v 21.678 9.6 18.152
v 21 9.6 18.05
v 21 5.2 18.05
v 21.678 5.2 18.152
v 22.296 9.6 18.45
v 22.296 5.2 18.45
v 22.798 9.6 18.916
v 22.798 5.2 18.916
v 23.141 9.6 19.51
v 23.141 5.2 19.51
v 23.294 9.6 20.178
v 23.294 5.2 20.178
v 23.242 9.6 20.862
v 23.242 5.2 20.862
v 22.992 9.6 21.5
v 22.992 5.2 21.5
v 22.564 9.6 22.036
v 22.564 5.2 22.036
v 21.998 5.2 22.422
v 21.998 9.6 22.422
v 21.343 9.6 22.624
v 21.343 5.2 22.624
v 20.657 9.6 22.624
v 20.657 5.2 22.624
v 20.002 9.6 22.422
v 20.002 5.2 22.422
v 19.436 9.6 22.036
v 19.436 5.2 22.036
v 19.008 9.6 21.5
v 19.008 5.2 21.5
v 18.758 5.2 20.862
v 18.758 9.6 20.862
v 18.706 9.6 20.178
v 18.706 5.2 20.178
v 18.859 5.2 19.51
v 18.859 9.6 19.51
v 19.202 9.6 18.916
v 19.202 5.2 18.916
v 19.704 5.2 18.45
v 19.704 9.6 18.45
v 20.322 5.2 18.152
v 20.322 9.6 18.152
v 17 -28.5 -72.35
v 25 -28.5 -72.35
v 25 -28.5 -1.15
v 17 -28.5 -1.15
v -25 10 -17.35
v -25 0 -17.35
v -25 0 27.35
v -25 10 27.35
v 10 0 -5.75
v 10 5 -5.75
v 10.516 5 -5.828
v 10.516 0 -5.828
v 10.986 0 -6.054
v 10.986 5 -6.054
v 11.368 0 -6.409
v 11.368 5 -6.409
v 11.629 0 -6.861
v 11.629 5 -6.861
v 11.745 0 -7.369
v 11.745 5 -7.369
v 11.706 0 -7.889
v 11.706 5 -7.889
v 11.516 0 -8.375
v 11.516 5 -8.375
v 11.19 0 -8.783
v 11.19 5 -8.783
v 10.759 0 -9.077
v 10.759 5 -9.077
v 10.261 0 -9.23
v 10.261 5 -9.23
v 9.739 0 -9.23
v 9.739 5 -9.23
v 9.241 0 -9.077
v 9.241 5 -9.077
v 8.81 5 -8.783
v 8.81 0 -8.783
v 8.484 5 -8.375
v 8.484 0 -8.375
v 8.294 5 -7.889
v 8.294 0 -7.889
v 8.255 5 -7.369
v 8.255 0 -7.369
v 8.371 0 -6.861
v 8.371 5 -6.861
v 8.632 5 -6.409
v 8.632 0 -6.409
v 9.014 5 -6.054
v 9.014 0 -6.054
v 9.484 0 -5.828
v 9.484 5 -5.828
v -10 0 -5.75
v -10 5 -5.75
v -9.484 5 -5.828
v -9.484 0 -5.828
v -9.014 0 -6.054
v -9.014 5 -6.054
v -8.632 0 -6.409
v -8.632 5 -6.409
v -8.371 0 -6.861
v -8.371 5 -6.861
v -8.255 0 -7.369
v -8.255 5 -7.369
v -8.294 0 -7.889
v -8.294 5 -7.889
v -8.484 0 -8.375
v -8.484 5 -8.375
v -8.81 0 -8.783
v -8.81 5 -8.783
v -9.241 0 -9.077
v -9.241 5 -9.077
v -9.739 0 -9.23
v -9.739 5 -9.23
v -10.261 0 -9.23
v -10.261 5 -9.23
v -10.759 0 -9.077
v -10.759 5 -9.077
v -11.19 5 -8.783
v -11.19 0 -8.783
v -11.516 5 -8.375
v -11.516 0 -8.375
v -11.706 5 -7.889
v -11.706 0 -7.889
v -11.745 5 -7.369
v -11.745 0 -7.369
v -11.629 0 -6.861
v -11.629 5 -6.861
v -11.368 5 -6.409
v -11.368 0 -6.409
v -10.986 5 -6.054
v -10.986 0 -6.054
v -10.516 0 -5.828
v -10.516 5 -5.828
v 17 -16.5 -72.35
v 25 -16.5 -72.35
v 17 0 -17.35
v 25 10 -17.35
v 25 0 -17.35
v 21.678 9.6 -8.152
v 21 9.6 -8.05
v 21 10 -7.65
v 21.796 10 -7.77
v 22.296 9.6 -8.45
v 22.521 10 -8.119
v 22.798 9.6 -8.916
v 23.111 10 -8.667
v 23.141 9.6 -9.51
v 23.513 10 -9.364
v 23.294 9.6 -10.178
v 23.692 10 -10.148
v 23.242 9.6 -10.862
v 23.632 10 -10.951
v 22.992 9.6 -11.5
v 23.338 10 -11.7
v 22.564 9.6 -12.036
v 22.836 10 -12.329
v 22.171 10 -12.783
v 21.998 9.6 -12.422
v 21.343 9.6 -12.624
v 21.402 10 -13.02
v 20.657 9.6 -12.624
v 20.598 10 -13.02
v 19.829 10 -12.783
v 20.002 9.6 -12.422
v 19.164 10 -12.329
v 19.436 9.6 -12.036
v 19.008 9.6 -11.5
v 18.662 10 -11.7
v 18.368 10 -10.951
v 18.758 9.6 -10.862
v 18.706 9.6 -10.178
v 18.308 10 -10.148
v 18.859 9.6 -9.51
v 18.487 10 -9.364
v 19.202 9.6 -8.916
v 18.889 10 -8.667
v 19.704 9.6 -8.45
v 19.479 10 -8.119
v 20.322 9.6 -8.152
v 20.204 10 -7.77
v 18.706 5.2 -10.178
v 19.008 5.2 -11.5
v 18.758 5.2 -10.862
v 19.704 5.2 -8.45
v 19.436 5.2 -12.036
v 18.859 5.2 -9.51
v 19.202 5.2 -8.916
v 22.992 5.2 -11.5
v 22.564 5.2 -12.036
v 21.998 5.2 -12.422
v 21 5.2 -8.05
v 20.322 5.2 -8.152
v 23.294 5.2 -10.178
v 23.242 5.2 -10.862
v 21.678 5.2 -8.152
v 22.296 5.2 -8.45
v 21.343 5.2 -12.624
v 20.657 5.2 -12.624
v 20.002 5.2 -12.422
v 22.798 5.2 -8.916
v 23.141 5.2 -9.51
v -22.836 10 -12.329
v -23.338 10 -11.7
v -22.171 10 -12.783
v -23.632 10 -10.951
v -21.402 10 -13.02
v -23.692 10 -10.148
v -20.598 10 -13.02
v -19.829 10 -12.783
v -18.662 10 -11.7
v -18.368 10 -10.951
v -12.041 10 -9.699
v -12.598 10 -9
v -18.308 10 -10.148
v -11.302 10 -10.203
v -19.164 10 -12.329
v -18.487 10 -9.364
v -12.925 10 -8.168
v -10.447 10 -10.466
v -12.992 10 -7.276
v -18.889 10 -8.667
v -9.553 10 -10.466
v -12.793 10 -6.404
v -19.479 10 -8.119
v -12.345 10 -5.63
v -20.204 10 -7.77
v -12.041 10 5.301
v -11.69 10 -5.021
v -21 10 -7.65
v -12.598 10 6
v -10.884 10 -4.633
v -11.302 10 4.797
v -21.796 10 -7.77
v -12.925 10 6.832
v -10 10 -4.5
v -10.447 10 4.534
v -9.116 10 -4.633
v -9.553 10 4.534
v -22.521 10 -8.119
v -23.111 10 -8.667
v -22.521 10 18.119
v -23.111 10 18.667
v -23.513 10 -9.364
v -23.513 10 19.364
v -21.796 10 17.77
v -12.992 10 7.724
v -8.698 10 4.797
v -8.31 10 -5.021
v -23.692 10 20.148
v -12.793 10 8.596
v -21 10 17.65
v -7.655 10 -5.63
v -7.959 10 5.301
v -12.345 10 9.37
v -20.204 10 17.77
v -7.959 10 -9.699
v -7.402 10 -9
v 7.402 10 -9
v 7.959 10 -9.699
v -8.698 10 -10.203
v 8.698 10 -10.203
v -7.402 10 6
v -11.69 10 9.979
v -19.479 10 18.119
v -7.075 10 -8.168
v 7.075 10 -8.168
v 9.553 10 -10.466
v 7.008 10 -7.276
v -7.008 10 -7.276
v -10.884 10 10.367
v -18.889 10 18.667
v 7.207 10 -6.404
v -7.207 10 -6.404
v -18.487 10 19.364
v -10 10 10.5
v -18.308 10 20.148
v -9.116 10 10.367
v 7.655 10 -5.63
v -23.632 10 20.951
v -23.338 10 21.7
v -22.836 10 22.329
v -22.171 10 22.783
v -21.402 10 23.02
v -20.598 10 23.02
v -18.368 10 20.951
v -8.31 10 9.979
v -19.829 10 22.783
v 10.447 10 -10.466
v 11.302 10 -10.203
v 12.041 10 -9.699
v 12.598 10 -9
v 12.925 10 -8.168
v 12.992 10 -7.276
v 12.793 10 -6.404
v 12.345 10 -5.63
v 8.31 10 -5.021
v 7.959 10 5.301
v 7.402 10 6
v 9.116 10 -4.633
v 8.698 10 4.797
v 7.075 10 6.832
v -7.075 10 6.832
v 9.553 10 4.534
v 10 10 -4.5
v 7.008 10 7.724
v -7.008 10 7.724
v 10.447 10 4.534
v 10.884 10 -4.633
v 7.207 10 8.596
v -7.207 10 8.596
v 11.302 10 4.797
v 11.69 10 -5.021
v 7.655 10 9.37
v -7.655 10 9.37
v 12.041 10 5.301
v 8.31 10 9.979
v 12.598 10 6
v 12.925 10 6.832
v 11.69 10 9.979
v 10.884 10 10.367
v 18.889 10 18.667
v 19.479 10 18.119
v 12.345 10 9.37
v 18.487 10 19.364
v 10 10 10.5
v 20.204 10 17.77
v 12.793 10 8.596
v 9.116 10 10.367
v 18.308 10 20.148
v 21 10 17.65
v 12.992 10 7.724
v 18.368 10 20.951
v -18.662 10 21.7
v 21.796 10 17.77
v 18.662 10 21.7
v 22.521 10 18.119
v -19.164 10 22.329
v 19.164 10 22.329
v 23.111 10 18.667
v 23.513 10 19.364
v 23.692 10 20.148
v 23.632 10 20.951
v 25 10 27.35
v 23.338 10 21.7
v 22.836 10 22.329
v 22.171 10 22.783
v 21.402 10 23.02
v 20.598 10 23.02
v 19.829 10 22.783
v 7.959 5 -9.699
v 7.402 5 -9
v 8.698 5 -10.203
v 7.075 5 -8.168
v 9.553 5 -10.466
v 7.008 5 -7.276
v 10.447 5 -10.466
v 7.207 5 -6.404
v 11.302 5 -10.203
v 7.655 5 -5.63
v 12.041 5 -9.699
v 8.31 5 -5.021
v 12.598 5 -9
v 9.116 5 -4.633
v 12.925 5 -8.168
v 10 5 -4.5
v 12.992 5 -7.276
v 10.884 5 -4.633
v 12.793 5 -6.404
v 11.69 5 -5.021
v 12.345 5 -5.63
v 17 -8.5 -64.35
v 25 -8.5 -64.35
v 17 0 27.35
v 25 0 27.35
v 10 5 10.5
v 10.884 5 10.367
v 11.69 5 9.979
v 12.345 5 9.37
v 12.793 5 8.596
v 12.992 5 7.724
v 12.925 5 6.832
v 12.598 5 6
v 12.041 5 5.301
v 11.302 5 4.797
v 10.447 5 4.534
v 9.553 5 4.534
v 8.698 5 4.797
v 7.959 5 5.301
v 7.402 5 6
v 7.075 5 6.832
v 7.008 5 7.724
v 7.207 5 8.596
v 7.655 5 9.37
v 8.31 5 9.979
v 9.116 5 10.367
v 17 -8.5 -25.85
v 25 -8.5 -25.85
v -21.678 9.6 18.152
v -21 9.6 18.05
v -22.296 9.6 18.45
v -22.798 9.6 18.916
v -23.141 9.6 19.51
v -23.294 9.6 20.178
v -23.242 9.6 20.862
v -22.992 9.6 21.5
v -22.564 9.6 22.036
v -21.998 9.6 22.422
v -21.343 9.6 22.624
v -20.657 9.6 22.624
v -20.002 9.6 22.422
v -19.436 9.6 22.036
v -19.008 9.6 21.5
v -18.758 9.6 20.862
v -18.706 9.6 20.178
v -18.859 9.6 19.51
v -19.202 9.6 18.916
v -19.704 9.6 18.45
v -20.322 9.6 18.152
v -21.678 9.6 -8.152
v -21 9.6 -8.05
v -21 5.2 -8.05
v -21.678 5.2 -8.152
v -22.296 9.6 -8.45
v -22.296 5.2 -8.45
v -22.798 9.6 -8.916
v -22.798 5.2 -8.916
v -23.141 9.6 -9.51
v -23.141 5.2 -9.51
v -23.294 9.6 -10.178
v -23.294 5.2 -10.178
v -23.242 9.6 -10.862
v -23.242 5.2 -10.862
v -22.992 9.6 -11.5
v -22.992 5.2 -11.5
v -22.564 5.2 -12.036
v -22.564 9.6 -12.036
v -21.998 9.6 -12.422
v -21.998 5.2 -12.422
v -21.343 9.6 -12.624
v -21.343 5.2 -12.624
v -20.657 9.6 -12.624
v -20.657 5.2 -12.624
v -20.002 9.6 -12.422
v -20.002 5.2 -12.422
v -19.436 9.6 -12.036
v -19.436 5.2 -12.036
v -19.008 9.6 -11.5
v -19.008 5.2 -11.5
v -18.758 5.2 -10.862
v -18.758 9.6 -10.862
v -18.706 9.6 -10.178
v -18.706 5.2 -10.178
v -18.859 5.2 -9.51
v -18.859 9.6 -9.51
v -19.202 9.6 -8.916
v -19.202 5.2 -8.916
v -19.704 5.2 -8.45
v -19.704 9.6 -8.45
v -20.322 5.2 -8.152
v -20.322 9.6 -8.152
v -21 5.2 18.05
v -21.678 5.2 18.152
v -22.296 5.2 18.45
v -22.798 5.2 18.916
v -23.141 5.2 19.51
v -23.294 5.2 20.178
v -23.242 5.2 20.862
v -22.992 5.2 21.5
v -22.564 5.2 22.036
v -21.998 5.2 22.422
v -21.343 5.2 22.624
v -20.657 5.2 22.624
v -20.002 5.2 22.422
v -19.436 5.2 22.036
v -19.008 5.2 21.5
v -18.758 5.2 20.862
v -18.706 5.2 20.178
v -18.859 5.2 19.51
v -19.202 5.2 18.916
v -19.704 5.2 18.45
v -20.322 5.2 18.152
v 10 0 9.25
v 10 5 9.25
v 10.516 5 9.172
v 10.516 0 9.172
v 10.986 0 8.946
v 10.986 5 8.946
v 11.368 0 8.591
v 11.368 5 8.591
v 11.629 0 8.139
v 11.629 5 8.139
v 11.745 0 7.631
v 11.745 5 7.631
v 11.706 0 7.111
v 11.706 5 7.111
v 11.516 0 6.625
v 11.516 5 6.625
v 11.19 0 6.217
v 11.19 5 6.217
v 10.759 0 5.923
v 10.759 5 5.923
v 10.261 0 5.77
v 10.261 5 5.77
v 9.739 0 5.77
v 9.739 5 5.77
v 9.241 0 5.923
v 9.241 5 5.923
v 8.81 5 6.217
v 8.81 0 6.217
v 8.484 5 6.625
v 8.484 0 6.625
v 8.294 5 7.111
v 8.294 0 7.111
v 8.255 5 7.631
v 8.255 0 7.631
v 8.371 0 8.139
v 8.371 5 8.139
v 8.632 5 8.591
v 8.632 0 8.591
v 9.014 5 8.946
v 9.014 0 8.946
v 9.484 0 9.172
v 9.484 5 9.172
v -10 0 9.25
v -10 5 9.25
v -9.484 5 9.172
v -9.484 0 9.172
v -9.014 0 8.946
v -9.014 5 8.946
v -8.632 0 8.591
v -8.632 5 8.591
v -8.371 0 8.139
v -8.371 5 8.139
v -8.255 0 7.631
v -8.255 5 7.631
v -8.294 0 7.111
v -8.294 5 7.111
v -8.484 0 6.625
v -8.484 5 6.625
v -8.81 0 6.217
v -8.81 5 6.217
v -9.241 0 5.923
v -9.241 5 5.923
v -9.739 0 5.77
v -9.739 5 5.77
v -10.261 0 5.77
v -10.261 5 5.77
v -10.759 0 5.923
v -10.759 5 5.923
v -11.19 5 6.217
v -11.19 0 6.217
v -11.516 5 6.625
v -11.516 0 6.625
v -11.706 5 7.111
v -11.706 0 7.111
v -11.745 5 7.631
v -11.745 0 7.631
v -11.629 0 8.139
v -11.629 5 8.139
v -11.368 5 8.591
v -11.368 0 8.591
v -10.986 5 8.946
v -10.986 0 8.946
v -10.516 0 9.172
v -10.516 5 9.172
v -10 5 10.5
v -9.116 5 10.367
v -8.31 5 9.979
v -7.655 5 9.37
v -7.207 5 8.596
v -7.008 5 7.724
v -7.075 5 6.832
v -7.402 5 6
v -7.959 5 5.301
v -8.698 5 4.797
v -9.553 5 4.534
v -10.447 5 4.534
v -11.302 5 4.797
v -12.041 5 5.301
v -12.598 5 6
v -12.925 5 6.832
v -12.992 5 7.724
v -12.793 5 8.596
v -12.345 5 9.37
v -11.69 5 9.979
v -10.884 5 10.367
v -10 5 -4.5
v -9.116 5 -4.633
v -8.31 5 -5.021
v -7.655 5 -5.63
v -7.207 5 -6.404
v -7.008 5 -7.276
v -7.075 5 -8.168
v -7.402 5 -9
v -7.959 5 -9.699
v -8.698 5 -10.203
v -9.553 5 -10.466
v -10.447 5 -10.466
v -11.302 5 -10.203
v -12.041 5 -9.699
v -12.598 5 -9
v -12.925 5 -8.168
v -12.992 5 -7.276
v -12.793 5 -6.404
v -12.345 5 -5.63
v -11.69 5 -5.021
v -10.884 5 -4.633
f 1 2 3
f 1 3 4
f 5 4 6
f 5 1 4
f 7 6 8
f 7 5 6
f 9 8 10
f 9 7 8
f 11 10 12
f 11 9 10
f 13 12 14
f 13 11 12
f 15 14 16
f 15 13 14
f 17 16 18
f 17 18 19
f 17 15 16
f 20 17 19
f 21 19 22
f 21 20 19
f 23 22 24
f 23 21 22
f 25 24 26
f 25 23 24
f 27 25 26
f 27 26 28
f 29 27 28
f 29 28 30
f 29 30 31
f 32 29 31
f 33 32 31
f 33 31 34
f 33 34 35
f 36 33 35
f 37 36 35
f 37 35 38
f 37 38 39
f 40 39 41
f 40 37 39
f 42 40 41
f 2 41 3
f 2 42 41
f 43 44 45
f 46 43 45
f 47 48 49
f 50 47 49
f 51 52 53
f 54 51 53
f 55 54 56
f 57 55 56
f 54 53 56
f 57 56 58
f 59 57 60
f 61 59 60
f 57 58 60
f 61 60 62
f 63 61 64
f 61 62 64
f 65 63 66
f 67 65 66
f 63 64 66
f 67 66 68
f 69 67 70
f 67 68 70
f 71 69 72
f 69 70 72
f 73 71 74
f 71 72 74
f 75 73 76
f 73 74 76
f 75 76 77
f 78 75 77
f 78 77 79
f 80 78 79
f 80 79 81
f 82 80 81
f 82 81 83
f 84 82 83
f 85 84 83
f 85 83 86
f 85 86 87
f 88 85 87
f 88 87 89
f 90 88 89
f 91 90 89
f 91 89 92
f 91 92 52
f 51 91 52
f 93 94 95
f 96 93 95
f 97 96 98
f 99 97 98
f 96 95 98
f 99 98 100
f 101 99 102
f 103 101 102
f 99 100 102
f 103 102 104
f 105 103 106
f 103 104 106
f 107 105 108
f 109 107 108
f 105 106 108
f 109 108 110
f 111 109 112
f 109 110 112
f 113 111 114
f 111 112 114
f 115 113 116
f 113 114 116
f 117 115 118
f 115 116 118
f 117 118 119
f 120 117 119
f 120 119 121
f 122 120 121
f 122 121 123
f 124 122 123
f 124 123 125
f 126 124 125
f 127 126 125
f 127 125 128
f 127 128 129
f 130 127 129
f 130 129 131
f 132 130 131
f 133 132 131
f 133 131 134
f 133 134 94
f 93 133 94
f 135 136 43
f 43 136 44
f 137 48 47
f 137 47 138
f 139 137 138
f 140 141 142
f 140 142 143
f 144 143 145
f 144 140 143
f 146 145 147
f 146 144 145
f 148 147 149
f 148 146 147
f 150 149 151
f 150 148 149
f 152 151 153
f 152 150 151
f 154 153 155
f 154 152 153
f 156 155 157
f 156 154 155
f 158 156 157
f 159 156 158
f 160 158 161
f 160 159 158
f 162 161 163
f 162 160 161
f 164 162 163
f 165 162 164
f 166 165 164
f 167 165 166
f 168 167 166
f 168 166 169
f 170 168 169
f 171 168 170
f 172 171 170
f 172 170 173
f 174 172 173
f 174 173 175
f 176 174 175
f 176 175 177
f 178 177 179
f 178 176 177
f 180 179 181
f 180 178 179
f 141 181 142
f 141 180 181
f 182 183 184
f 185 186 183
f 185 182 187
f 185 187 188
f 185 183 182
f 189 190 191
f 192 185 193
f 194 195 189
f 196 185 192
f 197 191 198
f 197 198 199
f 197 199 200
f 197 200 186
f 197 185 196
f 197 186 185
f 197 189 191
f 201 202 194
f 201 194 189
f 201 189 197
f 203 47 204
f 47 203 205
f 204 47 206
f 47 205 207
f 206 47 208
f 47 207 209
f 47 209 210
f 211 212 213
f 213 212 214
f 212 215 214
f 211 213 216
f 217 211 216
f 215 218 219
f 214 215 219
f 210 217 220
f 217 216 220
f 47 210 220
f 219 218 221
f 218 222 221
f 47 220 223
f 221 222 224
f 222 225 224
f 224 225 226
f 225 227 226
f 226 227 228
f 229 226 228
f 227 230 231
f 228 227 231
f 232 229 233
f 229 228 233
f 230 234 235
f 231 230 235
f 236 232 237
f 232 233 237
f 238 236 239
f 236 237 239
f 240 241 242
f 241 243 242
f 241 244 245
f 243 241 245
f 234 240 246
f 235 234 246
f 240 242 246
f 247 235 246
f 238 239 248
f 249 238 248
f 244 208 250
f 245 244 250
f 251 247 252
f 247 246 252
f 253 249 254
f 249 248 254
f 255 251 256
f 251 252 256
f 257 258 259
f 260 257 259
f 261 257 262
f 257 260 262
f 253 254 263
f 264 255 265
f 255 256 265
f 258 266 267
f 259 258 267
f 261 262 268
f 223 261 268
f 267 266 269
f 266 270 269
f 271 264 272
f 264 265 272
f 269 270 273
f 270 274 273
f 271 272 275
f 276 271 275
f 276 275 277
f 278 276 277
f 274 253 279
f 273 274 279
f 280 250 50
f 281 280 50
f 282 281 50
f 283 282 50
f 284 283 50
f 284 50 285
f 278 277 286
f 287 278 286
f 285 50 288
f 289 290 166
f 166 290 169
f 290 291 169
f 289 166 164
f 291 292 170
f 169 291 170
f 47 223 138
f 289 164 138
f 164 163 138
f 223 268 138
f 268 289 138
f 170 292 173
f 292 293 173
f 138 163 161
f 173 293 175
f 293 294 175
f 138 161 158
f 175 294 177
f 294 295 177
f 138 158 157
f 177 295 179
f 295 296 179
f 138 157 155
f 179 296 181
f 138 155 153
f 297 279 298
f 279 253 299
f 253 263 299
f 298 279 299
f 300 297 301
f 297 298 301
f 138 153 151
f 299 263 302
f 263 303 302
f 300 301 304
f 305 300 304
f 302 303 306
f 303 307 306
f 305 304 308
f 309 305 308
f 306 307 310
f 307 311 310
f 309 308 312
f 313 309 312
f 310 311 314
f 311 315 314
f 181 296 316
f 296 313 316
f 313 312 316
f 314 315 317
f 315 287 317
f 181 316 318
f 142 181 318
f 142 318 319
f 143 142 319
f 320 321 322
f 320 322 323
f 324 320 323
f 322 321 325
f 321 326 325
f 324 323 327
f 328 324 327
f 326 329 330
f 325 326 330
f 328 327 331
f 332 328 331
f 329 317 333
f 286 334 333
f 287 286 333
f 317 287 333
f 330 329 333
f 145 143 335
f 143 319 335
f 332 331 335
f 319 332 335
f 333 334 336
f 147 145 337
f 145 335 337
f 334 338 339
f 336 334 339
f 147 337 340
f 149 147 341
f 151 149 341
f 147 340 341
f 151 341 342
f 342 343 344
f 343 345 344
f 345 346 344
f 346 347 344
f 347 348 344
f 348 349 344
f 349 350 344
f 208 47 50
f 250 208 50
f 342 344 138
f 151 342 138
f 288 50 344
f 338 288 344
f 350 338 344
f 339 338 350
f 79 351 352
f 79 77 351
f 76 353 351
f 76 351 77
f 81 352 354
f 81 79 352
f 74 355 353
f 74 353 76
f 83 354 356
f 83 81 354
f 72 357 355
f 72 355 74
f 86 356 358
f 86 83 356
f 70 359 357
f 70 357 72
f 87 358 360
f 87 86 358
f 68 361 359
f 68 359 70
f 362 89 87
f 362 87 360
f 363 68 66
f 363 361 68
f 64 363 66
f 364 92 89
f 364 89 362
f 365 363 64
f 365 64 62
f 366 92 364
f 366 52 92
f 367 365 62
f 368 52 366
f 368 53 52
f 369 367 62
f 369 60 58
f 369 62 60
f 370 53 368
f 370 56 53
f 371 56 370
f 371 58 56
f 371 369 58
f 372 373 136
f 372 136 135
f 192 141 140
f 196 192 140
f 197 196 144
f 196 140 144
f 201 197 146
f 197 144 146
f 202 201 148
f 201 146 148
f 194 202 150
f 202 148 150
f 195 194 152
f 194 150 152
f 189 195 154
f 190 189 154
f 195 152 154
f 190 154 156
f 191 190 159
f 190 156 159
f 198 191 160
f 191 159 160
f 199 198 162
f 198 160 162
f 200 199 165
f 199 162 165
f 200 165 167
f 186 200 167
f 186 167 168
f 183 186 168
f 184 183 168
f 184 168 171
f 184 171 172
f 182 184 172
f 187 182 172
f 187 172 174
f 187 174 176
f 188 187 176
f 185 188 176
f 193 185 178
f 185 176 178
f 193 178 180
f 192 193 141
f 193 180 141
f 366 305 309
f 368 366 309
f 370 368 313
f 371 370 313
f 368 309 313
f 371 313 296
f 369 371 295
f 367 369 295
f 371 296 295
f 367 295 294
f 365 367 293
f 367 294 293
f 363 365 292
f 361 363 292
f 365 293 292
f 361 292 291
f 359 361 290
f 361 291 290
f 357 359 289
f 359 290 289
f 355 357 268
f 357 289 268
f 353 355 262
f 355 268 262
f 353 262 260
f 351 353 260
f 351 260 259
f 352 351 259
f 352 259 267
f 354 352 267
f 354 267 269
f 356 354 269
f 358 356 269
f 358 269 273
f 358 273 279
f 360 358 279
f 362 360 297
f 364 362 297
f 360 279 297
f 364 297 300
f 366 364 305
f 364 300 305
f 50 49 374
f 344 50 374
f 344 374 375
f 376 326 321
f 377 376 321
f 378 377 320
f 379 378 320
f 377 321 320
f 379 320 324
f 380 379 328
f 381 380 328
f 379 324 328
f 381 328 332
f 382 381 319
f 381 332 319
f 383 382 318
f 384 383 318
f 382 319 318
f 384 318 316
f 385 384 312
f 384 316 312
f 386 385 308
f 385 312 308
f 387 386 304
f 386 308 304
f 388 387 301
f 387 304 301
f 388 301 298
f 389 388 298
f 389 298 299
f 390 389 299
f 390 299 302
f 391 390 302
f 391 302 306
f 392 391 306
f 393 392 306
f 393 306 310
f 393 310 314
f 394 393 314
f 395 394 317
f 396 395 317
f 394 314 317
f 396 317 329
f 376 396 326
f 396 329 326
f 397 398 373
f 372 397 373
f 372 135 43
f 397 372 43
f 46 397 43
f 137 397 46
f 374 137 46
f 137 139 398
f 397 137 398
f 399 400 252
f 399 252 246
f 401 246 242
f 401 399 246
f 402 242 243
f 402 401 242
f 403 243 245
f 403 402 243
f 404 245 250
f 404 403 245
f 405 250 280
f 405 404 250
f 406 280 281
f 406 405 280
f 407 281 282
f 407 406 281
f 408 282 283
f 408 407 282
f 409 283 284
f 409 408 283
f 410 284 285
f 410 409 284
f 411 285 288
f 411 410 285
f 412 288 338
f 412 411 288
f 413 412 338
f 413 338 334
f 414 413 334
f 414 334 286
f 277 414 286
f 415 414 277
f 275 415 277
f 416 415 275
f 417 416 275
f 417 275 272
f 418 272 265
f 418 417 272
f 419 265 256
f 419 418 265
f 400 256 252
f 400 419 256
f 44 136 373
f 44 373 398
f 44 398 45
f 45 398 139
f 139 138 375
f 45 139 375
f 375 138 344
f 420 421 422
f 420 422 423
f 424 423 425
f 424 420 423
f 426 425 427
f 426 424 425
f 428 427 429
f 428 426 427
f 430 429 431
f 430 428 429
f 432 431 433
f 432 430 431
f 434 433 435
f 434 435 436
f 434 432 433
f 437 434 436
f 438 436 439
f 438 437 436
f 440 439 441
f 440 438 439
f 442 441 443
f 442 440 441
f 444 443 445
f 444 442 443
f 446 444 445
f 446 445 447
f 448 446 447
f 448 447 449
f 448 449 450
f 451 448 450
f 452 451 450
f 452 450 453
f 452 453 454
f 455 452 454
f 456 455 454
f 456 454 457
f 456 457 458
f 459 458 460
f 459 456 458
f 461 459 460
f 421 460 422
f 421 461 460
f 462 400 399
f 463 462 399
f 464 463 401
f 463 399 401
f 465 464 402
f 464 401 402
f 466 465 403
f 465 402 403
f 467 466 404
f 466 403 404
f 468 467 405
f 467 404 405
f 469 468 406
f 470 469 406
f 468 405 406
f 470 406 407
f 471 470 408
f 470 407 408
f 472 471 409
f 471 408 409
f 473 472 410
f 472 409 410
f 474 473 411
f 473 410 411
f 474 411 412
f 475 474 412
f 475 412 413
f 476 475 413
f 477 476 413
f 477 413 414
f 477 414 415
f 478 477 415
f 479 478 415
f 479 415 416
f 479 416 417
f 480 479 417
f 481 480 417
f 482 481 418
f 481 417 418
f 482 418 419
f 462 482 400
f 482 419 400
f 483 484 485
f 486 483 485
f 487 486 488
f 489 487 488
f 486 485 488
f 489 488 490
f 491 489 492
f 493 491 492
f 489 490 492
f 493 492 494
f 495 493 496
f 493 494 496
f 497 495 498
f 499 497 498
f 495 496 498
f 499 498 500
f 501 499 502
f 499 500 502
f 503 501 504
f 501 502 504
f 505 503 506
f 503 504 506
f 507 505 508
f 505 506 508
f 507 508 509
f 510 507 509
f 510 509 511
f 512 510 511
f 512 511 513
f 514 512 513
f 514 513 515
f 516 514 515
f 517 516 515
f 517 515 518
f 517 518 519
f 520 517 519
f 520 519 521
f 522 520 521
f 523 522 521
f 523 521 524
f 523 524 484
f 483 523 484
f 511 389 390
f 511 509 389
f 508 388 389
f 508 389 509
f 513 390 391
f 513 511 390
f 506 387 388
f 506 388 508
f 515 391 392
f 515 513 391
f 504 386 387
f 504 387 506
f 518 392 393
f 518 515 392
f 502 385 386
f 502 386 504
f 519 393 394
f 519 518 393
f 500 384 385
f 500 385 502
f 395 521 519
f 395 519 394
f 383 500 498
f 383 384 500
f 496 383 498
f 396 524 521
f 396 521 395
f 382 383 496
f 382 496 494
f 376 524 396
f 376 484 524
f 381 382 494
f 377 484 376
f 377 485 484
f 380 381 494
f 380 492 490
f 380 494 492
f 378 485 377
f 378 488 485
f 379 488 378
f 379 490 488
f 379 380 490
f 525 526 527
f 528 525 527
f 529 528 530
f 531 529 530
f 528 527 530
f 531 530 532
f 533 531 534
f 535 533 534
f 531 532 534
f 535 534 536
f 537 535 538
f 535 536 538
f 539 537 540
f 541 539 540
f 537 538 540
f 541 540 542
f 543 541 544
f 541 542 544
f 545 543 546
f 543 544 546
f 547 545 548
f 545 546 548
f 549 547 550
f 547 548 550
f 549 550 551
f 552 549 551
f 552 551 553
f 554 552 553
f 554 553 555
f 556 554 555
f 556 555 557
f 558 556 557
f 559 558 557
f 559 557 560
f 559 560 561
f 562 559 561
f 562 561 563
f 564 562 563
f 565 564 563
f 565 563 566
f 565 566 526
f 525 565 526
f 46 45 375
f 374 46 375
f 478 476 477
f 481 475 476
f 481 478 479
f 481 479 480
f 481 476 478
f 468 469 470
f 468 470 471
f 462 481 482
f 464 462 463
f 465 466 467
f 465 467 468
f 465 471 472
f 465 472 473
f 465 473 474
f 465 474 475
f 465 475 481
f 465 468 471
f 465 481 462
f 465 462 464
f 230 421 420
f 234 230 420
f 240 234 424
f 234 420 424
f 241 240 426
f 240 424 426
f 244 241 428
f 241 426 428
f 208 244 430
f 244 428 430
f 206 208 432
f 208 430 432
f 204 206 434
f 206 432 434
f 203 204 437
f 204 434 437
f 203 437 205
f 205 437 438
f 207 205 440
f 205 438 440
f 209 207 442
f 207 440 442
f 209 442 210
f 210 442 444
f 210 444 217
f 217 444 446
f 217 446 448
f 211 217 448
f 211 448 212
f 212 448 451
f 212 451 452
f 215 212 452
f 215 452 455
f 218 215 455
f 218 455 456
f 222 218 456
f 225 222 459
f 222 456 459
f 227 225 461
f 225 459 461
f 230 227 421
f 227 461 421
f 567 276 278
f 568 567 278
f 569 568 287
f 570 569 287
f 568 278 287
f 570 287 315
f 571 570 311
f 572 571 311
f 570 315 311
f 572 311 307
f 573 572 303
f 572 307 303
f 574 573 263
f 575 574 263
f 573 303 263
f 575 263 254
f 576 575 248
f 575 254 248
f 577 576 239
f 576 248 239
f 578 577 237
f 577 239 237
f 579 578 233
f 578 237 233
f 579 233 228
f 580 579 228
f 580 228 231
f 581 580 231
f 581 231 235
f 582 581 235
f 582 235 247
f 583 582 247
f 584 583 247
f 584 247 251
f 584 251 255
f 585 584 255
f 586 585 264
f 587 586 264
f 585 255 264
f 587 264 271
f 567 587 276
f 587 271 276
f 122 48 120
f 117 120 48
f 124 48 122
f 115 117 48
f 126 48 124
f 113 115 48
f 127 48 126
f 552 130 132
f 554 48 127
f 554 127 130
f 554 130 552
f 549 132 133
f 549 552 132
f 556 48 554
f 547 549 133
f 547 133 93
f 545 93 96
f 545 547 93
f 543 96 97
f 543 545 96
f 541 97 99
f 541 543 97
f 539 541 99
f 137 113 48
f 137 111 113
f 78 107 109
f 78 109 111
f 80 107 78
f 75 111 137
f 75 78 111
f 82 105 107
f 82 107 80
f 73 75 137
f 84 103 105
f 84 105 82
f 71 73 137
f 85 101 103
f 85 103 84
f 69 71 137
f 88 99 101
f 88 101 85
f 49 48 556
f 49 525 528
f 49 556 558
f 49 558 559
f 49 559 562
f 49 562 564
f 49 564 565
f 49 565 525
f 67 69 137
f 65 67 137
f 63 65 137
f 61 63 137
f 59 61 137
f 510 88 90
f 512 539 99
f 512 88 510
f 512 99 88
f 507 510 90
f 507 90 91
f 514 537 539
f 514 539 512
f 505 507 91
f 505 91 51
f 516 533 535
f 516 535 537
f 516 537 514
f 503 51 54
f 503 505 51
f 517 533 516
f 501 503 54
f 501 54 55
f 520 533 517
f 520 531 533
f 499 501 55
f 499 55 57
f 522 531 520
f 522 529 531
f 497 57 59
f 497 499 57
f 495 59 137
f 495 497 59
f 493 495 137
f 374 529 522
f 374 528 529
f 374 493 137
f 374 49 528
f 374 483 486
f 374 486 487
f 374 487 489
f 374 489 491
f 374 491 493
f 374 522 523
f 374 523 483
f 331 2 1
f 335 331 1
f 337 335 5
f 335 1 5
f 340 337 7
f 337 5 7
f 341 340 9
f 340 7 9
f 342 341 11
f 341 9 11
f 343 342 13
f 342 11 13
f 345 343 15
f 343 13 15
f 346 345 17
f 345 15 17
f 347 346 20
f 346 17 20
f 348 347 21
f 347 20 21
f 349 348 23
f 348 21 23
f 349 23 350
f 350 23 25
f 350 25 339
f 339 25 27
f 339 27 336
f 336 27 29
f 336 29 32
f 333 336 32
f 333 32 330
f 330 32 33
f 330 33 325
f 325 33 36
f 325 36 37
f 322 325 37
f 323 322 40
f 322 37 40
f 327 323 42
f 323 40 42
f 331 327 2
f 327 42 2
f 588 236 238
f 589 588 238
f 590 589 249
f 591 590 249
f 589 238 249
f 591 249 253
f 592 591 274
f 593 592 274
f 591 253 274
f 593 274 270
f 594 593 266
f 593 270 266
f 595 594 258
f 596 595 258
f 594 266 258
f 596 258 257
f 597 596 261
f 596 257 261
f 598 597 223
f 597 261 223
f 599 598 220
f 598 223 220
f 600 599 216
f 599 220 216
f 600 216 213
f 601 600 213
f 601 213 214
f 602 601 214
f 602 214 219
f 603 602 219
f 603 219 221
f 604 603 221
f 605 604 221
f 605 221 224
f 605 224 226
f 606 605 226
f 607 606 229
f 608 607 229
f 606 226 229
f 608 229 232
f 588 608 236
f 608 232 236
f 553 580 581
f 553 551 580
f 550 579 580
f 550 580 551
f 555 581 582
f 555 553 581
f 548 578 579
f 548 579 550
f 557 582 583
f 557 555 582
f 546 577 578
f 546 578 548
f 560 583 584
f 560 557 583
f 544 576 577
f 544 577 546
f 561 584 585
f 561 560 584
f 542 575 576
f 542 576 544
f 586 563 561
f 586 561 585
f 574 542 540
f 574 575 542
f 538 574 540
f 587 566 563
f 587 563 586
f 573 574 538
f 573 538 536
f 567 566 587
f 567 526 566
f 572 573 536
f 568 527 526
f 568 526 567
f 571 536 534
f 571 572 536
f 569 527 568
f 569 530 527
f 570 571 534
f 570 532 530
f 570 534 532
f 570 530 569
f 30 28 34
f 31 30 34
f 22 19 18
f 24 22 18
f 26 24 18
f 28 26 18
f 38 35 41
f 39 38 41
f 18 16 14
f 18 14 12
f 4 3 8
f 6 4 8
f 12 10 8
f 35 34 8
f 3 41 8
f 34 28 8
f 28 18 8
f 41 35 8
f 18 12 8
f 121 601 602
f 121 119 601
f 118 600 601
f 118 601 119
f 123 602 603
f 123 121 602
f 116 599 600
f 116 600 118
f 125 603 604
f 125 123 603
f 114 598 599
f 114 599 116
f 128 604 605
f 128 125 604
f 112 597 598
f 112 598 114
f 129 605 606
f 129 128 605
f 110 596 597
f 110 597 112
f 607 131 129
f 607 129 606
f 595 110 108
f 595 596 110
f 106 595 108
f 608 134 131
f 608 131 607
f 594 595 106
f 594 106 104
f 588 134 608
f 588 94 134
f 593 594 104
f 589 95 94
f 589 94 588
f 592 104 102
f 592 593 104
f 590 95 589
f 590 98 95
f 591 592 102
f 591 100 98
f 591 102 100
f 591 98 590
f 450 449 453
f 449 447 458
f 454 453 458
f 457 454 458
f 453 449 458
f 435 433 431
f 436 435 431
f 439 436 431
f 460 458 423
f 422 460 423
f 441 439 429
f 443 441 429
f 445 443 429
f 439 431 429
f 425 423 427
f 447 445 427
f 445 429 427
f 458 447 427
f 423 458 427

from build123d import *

# Parameters (mm, degrees)
SKETCH1_W               = 50
SKETCH1_H               = 34.7
BOSS_EXTRUDE1_DEPTH     = 10
CUT_EXTRUDE1_REACH      = 34.032
SKETCH2_R               = 1.75
SKETCH3_R               = 3
CUT_EXTRUDE2_DEPTH      = 5
SKETCH6_W               = 50
SKETCH6_H               = 10
BOSS_EXTRUDE3_DEPTH     = 10
BOSS_EXTRUDE4_DEPTH     = 8
CHAMFER1_SIZE           = 8
SKETCH10_R              = 2.3
CUT_EXTRUDE3_DEPTH      = 4.8
MIRROR2_COPY_1_SKETCH_R = 2.3
MIRROR2_COPY_1_DEPTH    = 4.8
CHAMFER2_SIZE           = 0.4


with BuildPart() as part:
    # Sketch1 → Boss-Extrude1 (new body)
    with BuildSketch(Plane(origin=(0, 0, 0), x_dir=(1, 0, 0), z_dir=(0, 1, 0))):
        Rectangle(SKETCH1_W, SKETCH1_H)
    extrude(amount=BOSS_EXTRUDE1_DEPTH)

    # Sketch2 → Cut-Extrude1 (cut, up to next)
    with BuildSketch(Plane(origin=(0, 10, 0), x_dir=(1, 0, 0), z_dir=(0, 1, 0)), mode=Mode.PRIVATE) as cut_extrude1_sk1:
        with Locations(Location((-10, 7.5, 0), (0, 0, 270))):
            Circle(SKETCH2_R)
    cut_extrude1_tool1 = extrude(cut_extrude1_sk1.sketch, amount=-CUT_EXTRUDE1_REACH, mode=Mode.PRIVATE) & part.part
    # Sketch2 → Cut-Extrude1 (cut, up to next)
    with BuildSketch(Plane(origin=(0, 10, 0), x_dir=(1, 0, 0), z_dir=(0, 1, 0)), mode=Mode.PRIVATE) as cut_extrude1_sk2:
        with Locations(Location((10, 7.5, 0), (0, 0, 270))):
            Circle(SKETCH2_R)
    cut_extrude1_tool2 = extrude(cut_extrude1_sk2.sketch, amount=-CUT_EXTRUDE1_REACH, mode=Mode.PRIVATE) & part.part
    # Sketch2 → Cut-Extrude1 (cut, up to next)
    with BuildSketch(Plane(origin=(0, 10, 0), x_dir=(1, 0, 0), z_dir=(0, 1, 0)), mode=Mode.PRIVATE) as cut_extrude1_sk3:
        with Locations(Location((10, -7.5, 0), (0, 0, 270))):
            Circle(SKETCH2_R)
    cut_extrude1_tool3 = extrude(cut_extrude1_sk3.sketch, amount=-CUT_EXTRUDE1_REACH, mode=Mode.PRIVATE) & part.part
    # Sketch2 → Cut-Extrude1 (cut, up to next)
    with BuildSketch(Plane(origin=(0, 10, 0), x_dir=(1, 0, 0), z_dir=(0, 1, 0)), mode=Mode.PRIVATE) as cut_extrude1_sk4:
        with Locations(Location((-10, -7.5, 0), (0, 0, 270))):
            Circle(SKETCH2_R)
    cut_extrude1_tool4 = extrude(cut_extrude1_sk4.sketch, amount=-CUT_EXTRUDE1_REACH, mode=Mode.PRIVATE) & part.part
    add(cut_extrude1_tool1.solids().sort_by_distance((-10, 10, -7.5))[0], mode=Mode.SUBTRACT)
    add(cut_extrude1_tool2.solids().sort_by_distance((10, 10, -7.5))[0], mode=Mode.SUBTRACT)
    add(cut_extrude1_tool3.solids().sort_by_distance((10, 10, 7.5))[0], mode=Mode.SUBTRACT)
    add(cut_extrude1_tool4.solids().sort_by_distance((-10, 10, 7.5))[0], mode=Mode.SUBTRACT)

    # Sketch3 → Cut-Extrude2 (cut)
    with BuildSketch(Plane(origin=(0, 10, 0), x_dir=(1, 0, 0), z_dir=(0, 1, 0))):
        with Locations(Location((-10, 7.5, 0), (0, 0, 270))):
            Circle(SKETCH3_R)
        with Locations(Location((10, 7.5, 0), (0, 0, 270))):
            Circle(SKETCH3_R)
        with Locations(Location((10, -7.5, 0), (0, 0, 270))):
            Circle(SKETCH3_R)
        with Locations(Location((-10, -7.5, 0), (0, 0, 270))):
            Circle(SKETCH3_R)
    extrude(amount=-CUT_EXTRUDE2_DEPTH, mode=Mode.SUBTRACT)

    # Sketch6 → Boss-Extrude3 (add)
    with BuildSketch(Plane.XZ):
        with Locations((0, 22.35)):
            Rectangle(SKETCH6_W, SKETCH6_H)
    extrude(amount=-BOSS_EXTRUDE3_DEPTH)

    # Sketch8 → Boss-Extrude4 (add)
    with BuildSketch(Plane(origin=(25, 0, 0), x_dir=(0, 0, -1), z_dir=(1, 0, 0))):
        Polygon((-27.35, 0), (17.35, 0), (25.85, -8.5), (72.35, -8.5), (72.35, -28.5), (1.15, -28.5), align=None)
    extrude(amount=-BOSS_EXTRUDE4_DEPTH)

    # Chamfer1
    chamfer1_edges = [part.edges().sort_by_distance(p)[0] for p in [
        (21, -8.5, -72.35),
    ]]
    chamfer(chamfer1_edges, length=CHAMFER1_SIZE)

    # Sketch10 → Cut-Extrude3 (cut)
    with BuildSketch(Plane(origin=(0, 10, 0), x_dir=(1, 0, 0), z_dir=(0, 1, 0))):
        with Locations(Location((21, 10.35, 0), (0, 0, 270))):
            Circle(SKETCH10_R)
    cut_extrude3 = extrude(amount=-CUT_EXTRUDE3_DEPTH, mode=Mode.SUBTRACT)

    # Mirror1: Cut-Extrude3 across plane
    add(cut_extrude3.mirror(Plane(origin=(0, 0, 5), x_dir=(1, 0, 0), z_dir=(0, 0, -1))), mode=Mode.SUBTRACT)

    # Mirror2: Cut-Extrude3 across plane
    add(cut_extrude3.mirror(Plane.ZY), mode=Mode.SUBTRACT)

    # Mirror2 copy 1 sketch → Mirror2 copy 1 (cut)
    with BuildSketch(Plane(origin=(0, 10, 10), x_dir=(-1, 0, 0), z_dir=(0, 1, 0))):
        with Locations(Location((21, 10.35, 0), (0, 0, 270))):
            Circle(MIRROR2_COPY_1_SKETCH_R)
    extrude(amount=-MIRROR2_COPY_1_DEPTH, mode=Mode.SUBTRACT)

    # Chamfer2
    chamfer2_edges = [part.edges().sort_by_distance(p)[0] for p in [
        (-21, 10, -12.65),
        (-21, 10, 22.65),
        (21, 10, -12.65),
        (21, 10, 22.65),
    ]]
    chamfer(chamfer2_edges, length=CHAMFER2_SIZE)


solid = part.part
